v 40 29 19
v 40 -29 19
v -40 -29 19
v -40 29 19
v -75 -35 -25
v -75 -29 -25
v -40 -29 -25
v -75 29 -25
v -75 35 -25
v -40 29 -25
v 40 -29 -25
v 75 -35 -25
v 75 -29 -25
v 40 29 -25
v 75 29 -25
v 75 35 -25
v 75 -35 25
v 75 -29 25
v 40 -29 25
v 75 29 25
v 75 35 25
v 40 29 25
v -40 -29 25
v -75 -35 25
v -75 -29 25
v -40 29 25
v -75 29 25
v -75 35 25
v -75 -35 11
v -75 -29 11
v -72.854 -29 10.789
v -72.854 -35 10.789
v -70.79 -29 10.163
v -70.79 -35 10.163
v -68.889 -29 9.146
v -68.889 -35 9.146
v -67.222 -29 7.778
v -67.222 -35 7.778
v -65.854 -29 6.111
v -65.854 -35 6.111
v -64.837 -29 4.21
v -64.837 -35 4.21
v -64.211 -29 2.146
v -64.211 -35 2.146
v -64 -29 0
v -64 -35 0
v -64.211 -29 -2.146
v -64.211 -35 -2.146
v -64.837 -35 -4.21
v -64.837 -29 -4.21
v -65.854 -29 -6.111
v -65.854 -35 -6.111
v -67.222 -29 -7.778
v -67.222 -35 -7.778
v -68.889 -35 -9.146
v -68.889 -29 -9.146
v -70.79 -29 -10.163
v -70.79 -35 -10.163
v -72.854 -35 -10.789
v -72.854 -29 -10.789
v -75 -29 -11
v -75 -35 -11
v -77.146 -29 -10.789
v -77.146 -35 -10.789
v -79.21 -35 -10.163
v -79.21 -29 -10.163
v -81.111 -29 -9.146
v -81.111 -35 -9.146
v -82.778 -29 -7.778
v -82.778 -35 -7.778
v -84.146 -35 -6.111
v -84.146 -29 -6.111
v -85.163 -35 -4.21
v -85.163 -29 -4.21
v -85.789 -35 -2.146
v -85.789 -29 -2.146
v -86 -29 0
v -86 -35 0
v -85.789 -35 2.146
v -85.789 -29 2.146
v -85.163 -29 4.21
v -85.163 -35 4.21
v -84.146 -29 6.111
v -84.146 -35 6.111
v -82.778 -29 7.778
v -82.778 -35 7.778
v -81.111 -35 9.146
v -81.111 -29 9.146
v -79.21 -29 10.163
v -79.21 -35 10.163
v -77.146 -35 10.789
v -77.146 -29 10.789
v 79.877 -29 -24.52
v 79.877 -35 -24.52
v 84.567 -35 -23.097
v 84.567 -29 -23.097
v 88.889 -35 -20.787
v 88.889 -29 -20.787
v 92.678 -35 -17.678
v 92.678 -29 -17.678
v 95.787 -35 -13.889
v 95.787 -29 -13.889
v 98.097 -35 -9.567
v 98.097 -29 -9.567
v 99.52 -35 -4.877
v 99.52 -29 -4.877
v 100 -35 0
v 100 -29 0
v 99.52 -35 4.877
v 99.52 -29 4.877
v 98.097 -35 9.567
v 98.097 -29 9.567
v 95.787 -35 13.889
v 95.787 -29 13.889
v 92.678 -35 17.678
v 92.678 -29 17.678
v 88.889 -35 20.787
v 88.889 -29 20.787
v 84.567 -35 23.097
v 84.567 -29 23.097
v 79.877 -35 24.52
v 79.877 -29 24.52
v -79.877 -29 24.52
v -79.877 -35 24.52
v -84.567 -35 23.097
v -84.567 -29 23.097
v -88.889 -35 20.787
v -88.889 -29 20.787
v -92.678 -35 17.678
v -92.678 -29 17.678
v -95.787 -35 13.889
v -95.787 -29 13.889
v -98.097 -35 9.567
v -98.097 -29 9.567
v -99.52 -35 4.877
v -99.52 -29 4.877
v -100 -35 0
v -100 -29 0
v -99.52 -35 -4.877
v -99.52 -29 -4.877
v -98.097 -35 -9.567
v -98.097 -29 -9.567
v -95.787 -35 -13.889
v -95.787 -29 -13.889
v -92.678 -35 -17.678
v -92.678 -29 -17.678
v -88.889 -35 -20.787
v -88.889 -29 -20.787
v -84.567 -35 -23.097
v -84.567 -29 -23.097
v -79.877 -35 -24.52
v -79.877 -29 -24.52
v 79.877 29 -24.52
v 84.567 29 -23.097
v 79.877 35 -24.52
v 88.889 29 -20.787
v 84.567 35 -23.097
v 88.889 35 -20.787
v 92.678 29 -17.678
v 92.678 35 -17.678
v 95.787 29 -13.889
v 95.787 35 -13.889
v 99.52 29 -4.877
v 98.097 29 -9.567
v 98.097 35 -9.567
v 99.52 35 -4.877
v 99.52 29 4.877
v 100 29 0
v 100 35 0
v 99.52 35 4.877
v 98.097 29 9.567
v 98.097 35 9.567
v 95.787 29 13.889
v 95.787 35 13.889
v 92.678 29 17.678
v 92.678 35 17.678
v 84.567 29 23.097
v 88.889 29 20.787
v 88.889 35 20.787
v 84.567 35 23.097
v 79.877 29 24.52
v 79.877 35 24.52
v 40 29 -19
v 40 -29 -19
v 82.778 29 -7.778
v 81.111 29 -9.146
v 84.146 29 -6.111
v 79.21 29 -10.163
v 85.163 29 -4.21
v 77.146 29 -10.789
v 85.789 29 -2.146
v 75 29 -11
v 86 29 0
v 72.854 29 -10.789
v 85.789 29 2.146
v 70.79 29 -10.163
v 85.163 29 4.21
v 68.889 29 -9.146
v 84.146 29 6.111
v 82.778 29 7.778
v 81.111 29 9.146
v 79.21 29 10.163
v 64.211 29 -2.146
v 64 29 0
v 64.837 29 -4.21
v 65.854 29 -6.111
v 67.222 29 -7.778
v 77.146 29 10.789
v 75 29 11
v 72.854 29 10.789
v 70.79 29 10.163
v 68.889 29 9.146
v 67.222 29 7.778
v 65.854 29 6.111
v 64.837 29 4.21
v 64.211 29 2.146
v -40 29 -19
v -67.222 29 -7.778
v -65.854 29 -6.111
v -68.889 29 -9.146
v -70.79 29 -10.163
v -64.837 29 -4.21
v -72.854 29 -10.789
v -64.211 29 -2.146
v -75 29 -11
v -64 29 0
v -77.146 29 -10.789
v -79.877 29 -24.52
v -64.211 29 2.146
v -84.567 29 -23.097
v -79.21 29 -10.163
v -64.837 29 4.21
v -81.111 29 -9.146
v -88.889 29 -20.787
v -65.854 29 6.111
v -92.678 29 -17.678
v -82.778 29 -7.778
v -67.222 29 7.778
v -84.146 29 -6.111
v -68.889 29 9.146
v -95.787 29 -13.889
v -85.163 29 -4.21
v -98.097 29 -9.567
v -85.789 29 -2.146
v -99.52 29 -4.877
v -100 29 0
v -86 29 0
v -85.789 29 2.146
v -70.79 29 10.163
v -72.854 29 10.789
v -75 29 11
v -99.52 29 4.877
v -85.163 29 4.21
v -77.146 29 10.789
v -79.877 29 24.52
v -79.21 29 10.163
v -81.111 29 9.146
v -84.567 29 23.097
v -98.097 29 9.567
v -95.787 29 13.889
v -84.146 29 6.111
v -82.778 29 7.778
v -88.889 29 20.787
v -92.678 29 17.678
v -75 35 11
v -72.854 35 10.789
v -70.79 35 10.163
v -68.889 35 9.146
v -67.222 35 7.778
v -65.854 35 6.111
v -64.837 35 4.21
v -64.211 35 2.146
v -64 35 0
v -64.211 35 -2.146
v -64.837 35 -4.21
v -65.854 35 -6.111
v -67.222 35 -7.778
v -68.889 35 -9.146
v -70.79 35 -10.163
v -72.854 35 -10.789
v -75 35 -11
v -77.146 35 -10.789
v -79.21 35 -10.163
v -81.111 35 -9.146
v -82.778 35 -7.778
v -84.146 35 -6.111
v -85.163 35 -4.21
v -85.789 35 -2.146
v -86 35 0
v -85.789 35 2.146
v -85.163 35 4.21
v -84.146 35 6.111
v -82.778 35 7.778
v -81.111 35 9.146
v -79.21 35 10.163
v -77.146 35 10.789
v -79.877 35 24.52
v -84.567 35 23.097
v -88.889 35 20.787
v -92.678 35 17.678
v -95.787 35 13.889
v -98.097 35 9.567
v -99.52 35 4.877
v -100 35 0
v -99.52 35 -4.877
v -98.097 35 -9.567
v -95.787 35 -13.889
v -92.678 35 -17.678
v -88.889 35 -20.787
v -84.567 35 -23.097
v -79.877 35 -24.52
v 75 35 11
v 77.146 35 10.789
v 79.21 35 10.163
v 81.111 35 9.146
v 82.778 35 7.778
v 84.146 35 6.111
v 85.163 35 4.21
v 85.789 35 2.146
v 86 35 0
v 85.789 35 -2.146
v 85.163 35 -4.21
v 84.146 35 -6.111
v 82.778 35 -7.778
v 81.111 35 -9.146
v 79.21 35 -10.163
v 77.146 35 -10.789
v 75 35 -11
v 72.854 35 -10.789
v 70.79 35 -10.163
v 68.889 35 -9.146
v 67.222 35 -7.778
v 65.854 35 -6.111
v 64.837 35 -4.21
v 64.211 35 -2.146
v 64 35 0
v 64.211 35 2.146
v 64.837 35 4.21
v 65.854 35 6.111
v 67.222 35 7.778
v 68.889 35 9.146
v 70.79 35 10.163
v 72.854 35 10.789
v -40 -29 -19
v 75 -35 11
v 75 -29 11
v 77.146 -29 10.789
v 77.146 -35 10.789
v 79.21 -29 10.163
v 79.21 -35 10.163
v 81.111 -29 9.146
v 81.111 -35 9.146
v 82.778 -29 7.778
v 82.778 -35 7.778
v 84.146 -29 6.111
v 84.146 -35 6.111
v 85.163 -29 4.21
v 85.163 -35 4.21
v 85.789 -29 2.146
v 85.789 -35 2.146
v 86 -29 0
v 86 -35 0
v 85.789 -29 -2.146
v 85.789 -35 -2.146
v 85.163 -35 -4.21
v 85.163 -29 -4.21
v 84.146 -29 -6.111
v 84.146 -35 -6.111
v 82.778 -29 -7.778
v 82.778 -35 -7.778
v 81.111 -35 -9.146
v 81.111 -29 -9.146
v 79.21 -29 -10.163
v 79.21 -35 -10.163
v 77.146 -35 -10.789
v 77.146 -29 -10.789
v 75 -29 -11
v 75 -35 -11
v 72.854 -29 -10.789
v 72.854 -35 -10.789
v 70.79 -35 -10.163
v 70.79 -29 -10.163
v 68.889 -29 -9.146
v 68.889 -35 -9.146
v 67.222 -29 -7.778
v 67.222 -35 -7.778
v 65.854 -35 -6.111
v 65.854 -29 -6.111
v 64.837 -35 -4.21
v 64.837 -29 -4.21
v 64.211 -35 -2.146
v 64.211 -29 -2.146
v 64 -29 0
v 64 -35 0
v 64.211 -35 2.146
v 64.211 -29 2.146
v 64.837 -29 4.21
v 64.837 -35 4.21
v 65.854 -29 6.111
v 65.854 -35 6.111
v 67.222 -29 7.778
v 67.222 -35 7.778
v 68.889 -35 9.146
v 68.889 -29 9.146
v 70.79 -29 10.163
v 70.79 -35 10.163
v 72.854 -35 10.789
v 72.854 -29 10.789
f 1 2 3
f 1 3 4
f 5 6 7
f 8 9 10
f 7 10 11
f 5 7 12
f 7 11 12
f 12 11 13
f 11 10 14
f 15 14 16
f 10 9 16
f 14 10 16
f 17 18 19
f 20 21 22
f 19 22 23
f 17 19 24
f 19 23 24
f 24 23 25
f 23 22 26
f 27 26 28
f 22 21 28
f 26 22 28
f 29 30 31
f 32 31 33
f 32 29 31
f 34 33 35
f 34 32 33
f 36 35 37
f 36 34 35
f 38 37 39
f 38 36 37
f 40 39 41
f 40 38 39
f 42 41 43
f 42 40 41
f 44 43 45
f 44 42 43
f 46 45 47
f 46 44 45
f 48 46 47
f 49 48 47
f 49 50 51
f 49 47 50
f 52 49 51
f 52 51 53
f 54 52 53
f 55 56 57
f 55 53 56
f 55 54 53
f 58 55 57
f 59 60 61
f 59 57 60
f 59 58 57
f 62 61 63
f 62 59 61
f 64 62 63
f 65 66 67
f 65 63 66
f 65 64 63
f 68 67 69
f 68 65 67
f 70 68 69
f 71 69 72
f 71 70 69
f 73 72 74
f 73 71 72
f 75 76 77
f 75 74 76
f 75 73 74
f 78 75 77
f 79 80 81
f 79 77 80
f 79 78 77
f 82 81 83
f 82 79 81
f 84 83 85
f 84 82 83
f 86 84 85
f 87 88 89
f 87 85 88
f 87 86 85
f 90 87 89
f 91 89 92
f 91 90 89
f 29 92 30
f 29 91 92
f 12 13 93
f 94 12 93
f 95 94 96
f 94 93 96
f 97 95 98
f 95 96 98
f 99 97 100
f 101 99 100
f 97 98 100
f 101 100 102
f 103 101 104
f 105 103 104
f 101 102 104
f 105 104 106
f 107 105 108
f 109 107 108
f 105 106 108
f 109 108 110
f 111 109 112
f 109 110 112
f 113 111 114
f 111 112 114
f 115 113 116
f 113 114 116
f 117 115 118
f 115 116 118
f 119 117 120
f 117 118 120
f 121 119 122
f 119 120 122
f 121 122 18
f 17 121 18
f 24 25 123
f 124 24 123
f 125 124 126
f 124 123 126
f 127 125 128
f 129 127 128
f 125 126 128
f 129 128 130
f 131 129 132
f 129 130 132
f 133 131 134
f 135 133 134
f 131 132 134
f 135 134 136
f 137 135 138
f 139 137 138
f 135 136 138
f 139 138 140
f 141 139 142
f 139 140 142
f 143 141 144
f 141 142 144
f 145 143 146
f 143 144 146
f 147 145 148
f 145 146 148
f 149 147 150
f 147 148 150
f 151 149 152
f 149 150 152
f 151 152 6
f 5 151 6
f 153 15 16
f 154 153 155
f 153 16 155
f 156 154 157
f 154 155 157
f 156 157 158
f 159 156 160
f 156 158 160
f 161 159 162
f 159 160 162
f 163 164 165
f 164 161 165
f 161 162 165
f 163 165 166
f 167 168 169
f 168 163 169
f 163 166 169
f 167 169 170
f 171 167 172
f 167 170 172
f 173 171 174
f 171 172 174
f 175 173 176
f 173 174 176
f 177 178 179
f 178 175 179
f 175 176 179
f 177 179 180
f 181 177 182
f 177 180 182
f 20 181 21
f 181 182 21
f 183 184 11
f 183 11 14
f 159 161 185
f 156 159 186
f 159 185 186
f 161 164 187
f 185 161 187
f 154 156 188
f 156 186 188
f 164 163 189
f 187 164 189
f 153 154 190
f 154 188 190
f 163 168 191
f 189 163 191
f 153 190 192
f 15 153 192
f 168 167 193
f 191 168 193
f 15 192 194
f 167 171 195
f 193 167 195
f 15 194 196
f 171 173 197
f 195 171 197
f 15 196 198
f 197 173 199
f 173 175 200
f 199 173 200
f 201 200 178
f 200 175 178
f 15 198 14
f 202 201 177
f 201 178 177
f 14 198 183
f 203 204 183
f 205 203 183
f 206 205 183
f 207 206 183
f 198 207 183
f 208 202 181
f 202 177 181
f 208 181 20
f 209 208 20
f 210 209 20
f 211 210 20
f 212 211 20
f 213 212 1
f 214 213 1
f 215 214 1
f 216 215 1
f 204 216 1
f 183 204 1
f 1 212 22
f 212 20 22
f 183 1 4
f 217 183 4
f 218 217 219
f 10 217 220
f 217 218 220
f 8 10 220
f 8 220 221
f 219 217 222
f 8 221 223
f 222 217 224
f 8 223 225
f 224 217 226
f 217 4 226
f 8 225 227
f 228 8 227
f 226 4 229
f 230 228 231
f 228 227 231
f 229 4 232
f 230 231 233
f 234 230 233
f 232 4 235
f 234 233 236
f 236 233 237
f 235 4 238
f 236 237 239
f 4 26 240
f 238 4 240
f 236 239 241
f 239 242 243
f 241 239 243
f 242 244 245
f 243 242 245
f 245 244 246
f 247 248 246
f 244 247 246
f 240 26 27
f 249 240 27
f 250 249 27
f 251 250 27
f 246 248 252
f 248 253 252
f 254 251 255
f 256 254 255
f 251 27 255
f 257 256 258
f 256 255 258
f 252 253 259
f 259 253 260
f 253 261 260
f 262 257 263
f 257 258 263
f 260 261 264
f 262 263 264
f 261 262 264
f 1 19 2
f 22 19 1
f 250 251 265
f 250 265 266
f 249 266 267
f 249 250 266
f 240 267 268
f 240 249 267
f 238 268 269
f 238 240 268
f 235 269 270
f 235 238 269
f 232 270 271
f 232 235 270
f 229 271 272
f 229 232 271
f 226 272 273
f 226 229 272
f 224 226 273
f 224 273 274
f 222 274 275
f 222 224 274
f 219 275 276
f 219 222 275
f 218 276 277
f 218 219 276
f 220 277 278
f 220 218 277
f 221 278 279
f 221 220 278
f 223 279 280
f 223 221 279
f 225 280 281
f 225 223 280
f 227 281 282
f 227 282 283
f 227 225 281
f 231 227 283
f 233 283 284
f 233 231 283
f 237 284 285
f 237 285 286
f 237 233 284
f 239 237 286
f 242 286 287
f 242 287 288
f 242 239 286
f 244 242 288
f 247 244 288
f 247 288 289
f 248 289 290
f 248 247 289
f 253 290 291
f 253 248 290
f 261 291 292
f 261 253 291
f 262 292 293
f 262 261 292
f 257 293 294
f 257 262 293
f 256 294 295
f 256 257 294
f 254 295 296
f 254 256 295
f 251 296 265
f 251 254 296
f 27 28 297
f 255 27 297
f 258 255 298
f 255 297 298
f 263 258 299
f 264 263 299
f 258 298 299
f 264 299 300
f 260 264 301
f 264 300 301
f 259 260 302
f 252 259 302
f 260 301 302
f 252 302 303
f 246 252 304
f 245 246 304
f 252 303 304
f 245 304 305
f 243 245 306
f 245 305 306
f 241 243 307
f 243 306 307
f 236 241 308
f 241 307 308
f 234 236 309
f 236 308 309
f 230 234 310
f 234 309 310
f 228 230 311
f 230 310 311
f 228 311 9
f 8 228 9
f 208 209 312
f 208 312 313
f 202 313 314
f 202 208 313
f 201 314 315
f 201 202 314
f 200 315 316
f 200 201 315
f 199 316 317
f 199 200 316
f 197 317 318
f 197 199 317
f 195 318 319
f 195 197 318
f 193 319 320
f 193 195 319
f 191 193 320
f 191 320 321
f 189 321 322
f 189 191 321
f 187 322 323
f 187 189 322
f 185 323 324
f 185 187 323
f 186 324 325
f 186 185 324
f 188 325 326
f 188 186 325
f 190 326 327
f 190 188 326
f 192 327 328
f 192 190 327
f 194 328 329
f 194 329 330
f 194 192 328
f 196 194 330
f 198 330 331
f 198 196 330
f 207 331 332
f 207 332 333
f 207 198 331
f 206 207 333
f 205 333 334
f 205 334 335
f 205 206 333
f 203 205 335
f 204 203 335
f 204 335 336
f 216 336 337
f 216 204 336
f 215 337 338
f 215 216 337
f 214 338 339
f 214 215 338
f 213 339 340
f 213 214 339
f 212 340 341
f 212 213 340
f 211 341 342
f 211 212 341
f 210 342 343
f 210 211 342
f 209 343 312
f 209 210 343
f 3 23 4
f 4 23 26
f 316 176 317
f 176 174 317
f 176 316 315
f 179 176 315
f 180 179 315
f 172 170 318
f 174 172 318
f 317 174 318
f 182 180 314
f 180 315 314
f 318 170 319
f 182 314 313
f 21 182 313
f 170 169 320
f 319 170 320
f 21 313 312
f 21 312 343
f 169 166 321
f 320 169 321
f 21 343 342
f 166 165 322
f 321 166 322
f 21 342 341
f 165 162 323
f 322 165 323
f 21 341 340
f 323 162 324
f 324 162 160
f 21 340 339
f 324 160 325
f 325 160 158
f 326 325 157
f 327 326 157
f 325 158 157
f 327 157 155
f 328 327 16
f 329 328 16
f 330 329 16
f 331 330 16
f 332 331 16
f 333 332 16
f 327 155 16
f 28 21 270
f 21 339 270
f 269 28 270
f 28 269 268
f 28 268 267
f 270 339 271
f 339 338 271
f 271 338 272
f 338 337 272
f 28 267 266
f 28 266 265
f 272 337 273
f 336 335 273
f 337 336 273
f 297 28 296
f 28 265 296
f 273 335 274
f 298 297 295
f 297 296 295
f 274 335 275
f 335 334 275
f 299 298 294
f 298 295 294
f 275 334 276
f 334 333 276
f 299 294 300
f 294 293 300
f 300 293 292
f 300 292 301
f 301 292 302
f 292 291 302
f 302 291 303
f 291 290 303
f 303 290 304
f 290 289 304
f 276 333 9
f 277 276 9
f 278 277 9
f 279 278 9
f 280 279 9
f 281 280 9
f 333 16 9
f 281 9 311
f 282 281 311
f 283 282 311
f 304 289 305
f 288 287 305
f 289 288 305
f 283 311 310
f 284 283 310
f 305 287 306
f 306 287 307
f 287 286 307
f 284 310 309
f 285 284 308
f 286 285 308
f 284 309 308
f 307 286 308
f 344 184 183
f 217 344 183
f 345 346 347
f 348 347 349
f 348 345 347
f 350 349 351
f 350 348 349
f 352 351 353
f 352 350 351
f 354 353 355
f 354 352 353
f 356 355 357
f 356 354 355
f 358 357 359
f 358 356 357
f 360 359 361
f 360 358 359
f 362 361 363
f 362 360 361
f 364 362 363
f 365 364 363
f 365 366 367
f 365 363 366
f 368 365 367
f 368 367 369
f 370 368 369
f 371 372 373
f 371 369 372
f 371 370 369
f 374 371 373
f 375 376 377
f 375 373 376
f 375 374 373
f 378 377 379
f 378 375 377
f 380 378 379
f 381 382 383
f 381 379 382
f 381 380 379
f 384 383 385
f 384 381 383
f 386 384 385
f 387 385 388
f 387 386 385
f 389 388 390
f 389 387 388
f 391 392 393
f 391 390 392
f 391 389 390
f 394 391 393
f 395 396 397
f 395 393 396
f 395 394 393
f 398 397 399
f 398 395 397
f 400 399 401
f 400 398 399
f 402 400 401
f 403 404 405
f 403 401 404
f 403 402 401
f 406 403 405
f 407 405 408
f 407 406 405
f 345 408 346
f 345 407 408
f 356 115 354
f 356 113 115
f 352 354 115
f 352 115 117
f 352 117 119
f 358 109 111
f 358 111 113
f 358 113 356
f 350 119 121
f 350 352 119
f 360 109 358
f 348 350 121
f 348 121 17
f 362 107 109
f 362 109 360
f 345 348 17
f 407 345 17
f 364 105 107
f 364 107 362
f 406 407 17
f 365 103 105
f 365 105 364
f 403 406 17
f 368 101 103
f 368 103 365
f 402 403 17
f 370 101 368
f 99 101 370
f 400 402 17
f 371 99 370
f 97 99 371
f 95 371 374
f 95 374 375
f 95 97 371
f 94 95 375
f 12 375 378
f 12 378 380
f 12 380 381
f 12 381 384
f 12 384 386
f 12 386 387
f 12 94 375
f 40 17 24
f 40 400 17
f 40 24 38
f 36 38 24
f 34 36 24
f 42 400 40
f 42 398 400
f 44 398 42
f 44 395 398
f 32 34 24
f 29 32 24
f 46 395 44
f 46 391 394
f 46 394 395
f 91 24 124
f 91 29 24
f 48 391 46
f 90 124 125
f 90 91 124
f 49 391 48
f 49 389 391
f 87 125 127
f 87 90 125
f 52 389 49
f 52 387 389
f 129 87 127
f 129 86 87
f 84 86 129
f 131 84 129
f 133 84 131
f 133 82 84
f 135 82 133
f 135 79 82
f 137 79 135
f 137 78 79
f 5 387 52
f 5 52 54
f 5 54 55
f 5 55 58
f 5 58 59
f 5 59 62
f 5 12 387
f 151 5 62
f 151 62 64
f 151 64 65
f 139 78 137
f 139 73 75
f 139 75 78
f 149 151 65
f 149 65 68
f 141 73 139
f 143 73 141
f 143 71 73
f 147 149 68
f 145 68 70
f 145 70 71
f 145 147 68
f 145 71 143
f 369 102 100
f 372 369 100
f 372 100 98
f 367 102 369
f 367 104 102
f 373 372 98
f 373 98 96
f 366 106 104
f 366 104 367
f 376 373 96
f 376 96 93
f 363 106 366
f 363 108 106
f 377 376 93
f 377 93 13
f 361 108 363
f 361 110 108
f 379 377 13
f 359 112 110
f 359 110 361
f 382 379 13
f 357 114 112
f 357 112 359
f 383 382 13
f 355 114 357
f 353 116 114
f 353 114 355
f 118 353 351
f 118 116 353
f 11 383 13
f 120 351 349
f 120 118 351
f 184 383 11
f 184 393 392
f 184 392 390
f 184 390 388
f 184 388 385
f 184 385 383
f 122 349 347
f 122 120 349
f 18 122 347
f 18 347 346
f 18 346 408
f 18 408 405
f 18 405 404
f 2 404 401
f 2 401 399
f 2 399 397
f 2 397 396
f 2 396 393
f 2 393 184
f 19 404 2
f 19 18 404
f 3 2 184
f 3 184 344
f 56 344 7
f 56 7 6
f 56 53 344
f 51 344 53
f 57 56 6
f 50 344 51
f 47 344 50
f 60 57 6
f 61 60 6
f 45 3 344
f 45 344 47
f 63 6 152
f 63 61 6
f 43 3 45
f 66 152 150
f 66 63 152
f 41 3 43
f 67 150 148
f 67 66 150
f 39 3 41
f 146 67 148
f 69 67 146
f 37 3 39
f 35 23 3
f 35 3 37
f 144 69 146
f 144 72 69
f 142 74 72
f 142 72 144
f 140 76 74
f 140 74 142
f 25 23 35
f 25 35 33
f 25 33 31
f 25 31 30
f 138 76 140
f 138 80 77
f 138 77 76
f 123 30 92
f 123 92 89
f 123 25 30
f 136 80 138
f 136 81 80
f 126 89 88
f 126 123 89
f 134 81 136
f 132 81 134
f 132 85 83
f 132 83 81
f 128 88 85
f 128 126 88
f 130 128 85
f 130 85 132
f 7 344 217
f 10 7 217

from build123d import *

# Parameters (mm, degrees)
SKETCH1_R           = 11
BOSS_EXTRUDE1_DEPTH = 35
SKETCH2_W           = 60
SKETCH2_H           = 58
CUT_EXTRUDE1_DEPTH  = 109.857705285
CUT_EXTRUDE2_REACH  = 148.458
SKETCH3_W           = 38
SKETCH3_H           = 58


with BuildPart() as part:
    # Sketch1 → Boss-Extrude1 (new, symmetric)
    with BuildSketch(Plane(origin=(0, 0, 0), x_dir=(1, 0, 0), z_dir=(0, 1, 0))):
        with BuildLine():
            Line((-75, 25), (75, 25))
            ThreePointArc((75, 25), (100, 0), (75, -25))
            Line((75, -25), (-75, -25))
            ThreePointArc((-75, -25), (-100, 0), (-75, 25))
        make_face()
        with Locations(Location((75, 0, 0), (0, 0, 270))):
            Circle(SKETCH1_R, mode=Mode.SUBTRACT)
        with Locations(Location((-75, 0, 0), (0, 0, 270))):
            Circle(SKETCH1_R, mode=Mode.SUBTRACT)
    extrude(amount=BOSS_EXTRUDE1_DEPTH, both=True)

    # Sketch2 → Cut-Extrude1 (cut, symmetric)
    with BuildSketch(Plane.XY):
        with Locations((70, 0)):
            Rectangle(SKETCH2_W, SKETCH2_H)
    cut_extrude1 = extrude(amount=CUT_EXTRUDE1_DEPTH, both=True, mode=Mode.SUBTRACT)

    # Mirror1: Cut-Extrude1 across plane
    add(cut_extrude1.mirror(Plane(origin=(0, 0, 0), x_dir=(0, 0, 1), z_dir=(1, 0, 0))), mode=Mode.SUBTRACT)

    # Sketch3 → Cut-Extrude2 (cut, up to next)
    with BuildSketch(Plane(origin=(40, 0, 0), x_dir=(0, 0, -1), z_dir=(1, 0, 0)), mode=Mode.PRIVATE) as cut_extrude2_sk1:
        Rectangle(SKETCH3_W, SKETCH3_H)
    cut_extrude2_tool1 = extrude(cut_extrude2_sk1.sketch, amount=-CUT_EXTRUDE2_REACH, mode=Mode.PRIVATE) & part.part
    add(cut_extrude2_tool1.solids().sort_by_distance((40, 0, 0))[0], mode=Mode.SUBTRACT)


solid = part.part
